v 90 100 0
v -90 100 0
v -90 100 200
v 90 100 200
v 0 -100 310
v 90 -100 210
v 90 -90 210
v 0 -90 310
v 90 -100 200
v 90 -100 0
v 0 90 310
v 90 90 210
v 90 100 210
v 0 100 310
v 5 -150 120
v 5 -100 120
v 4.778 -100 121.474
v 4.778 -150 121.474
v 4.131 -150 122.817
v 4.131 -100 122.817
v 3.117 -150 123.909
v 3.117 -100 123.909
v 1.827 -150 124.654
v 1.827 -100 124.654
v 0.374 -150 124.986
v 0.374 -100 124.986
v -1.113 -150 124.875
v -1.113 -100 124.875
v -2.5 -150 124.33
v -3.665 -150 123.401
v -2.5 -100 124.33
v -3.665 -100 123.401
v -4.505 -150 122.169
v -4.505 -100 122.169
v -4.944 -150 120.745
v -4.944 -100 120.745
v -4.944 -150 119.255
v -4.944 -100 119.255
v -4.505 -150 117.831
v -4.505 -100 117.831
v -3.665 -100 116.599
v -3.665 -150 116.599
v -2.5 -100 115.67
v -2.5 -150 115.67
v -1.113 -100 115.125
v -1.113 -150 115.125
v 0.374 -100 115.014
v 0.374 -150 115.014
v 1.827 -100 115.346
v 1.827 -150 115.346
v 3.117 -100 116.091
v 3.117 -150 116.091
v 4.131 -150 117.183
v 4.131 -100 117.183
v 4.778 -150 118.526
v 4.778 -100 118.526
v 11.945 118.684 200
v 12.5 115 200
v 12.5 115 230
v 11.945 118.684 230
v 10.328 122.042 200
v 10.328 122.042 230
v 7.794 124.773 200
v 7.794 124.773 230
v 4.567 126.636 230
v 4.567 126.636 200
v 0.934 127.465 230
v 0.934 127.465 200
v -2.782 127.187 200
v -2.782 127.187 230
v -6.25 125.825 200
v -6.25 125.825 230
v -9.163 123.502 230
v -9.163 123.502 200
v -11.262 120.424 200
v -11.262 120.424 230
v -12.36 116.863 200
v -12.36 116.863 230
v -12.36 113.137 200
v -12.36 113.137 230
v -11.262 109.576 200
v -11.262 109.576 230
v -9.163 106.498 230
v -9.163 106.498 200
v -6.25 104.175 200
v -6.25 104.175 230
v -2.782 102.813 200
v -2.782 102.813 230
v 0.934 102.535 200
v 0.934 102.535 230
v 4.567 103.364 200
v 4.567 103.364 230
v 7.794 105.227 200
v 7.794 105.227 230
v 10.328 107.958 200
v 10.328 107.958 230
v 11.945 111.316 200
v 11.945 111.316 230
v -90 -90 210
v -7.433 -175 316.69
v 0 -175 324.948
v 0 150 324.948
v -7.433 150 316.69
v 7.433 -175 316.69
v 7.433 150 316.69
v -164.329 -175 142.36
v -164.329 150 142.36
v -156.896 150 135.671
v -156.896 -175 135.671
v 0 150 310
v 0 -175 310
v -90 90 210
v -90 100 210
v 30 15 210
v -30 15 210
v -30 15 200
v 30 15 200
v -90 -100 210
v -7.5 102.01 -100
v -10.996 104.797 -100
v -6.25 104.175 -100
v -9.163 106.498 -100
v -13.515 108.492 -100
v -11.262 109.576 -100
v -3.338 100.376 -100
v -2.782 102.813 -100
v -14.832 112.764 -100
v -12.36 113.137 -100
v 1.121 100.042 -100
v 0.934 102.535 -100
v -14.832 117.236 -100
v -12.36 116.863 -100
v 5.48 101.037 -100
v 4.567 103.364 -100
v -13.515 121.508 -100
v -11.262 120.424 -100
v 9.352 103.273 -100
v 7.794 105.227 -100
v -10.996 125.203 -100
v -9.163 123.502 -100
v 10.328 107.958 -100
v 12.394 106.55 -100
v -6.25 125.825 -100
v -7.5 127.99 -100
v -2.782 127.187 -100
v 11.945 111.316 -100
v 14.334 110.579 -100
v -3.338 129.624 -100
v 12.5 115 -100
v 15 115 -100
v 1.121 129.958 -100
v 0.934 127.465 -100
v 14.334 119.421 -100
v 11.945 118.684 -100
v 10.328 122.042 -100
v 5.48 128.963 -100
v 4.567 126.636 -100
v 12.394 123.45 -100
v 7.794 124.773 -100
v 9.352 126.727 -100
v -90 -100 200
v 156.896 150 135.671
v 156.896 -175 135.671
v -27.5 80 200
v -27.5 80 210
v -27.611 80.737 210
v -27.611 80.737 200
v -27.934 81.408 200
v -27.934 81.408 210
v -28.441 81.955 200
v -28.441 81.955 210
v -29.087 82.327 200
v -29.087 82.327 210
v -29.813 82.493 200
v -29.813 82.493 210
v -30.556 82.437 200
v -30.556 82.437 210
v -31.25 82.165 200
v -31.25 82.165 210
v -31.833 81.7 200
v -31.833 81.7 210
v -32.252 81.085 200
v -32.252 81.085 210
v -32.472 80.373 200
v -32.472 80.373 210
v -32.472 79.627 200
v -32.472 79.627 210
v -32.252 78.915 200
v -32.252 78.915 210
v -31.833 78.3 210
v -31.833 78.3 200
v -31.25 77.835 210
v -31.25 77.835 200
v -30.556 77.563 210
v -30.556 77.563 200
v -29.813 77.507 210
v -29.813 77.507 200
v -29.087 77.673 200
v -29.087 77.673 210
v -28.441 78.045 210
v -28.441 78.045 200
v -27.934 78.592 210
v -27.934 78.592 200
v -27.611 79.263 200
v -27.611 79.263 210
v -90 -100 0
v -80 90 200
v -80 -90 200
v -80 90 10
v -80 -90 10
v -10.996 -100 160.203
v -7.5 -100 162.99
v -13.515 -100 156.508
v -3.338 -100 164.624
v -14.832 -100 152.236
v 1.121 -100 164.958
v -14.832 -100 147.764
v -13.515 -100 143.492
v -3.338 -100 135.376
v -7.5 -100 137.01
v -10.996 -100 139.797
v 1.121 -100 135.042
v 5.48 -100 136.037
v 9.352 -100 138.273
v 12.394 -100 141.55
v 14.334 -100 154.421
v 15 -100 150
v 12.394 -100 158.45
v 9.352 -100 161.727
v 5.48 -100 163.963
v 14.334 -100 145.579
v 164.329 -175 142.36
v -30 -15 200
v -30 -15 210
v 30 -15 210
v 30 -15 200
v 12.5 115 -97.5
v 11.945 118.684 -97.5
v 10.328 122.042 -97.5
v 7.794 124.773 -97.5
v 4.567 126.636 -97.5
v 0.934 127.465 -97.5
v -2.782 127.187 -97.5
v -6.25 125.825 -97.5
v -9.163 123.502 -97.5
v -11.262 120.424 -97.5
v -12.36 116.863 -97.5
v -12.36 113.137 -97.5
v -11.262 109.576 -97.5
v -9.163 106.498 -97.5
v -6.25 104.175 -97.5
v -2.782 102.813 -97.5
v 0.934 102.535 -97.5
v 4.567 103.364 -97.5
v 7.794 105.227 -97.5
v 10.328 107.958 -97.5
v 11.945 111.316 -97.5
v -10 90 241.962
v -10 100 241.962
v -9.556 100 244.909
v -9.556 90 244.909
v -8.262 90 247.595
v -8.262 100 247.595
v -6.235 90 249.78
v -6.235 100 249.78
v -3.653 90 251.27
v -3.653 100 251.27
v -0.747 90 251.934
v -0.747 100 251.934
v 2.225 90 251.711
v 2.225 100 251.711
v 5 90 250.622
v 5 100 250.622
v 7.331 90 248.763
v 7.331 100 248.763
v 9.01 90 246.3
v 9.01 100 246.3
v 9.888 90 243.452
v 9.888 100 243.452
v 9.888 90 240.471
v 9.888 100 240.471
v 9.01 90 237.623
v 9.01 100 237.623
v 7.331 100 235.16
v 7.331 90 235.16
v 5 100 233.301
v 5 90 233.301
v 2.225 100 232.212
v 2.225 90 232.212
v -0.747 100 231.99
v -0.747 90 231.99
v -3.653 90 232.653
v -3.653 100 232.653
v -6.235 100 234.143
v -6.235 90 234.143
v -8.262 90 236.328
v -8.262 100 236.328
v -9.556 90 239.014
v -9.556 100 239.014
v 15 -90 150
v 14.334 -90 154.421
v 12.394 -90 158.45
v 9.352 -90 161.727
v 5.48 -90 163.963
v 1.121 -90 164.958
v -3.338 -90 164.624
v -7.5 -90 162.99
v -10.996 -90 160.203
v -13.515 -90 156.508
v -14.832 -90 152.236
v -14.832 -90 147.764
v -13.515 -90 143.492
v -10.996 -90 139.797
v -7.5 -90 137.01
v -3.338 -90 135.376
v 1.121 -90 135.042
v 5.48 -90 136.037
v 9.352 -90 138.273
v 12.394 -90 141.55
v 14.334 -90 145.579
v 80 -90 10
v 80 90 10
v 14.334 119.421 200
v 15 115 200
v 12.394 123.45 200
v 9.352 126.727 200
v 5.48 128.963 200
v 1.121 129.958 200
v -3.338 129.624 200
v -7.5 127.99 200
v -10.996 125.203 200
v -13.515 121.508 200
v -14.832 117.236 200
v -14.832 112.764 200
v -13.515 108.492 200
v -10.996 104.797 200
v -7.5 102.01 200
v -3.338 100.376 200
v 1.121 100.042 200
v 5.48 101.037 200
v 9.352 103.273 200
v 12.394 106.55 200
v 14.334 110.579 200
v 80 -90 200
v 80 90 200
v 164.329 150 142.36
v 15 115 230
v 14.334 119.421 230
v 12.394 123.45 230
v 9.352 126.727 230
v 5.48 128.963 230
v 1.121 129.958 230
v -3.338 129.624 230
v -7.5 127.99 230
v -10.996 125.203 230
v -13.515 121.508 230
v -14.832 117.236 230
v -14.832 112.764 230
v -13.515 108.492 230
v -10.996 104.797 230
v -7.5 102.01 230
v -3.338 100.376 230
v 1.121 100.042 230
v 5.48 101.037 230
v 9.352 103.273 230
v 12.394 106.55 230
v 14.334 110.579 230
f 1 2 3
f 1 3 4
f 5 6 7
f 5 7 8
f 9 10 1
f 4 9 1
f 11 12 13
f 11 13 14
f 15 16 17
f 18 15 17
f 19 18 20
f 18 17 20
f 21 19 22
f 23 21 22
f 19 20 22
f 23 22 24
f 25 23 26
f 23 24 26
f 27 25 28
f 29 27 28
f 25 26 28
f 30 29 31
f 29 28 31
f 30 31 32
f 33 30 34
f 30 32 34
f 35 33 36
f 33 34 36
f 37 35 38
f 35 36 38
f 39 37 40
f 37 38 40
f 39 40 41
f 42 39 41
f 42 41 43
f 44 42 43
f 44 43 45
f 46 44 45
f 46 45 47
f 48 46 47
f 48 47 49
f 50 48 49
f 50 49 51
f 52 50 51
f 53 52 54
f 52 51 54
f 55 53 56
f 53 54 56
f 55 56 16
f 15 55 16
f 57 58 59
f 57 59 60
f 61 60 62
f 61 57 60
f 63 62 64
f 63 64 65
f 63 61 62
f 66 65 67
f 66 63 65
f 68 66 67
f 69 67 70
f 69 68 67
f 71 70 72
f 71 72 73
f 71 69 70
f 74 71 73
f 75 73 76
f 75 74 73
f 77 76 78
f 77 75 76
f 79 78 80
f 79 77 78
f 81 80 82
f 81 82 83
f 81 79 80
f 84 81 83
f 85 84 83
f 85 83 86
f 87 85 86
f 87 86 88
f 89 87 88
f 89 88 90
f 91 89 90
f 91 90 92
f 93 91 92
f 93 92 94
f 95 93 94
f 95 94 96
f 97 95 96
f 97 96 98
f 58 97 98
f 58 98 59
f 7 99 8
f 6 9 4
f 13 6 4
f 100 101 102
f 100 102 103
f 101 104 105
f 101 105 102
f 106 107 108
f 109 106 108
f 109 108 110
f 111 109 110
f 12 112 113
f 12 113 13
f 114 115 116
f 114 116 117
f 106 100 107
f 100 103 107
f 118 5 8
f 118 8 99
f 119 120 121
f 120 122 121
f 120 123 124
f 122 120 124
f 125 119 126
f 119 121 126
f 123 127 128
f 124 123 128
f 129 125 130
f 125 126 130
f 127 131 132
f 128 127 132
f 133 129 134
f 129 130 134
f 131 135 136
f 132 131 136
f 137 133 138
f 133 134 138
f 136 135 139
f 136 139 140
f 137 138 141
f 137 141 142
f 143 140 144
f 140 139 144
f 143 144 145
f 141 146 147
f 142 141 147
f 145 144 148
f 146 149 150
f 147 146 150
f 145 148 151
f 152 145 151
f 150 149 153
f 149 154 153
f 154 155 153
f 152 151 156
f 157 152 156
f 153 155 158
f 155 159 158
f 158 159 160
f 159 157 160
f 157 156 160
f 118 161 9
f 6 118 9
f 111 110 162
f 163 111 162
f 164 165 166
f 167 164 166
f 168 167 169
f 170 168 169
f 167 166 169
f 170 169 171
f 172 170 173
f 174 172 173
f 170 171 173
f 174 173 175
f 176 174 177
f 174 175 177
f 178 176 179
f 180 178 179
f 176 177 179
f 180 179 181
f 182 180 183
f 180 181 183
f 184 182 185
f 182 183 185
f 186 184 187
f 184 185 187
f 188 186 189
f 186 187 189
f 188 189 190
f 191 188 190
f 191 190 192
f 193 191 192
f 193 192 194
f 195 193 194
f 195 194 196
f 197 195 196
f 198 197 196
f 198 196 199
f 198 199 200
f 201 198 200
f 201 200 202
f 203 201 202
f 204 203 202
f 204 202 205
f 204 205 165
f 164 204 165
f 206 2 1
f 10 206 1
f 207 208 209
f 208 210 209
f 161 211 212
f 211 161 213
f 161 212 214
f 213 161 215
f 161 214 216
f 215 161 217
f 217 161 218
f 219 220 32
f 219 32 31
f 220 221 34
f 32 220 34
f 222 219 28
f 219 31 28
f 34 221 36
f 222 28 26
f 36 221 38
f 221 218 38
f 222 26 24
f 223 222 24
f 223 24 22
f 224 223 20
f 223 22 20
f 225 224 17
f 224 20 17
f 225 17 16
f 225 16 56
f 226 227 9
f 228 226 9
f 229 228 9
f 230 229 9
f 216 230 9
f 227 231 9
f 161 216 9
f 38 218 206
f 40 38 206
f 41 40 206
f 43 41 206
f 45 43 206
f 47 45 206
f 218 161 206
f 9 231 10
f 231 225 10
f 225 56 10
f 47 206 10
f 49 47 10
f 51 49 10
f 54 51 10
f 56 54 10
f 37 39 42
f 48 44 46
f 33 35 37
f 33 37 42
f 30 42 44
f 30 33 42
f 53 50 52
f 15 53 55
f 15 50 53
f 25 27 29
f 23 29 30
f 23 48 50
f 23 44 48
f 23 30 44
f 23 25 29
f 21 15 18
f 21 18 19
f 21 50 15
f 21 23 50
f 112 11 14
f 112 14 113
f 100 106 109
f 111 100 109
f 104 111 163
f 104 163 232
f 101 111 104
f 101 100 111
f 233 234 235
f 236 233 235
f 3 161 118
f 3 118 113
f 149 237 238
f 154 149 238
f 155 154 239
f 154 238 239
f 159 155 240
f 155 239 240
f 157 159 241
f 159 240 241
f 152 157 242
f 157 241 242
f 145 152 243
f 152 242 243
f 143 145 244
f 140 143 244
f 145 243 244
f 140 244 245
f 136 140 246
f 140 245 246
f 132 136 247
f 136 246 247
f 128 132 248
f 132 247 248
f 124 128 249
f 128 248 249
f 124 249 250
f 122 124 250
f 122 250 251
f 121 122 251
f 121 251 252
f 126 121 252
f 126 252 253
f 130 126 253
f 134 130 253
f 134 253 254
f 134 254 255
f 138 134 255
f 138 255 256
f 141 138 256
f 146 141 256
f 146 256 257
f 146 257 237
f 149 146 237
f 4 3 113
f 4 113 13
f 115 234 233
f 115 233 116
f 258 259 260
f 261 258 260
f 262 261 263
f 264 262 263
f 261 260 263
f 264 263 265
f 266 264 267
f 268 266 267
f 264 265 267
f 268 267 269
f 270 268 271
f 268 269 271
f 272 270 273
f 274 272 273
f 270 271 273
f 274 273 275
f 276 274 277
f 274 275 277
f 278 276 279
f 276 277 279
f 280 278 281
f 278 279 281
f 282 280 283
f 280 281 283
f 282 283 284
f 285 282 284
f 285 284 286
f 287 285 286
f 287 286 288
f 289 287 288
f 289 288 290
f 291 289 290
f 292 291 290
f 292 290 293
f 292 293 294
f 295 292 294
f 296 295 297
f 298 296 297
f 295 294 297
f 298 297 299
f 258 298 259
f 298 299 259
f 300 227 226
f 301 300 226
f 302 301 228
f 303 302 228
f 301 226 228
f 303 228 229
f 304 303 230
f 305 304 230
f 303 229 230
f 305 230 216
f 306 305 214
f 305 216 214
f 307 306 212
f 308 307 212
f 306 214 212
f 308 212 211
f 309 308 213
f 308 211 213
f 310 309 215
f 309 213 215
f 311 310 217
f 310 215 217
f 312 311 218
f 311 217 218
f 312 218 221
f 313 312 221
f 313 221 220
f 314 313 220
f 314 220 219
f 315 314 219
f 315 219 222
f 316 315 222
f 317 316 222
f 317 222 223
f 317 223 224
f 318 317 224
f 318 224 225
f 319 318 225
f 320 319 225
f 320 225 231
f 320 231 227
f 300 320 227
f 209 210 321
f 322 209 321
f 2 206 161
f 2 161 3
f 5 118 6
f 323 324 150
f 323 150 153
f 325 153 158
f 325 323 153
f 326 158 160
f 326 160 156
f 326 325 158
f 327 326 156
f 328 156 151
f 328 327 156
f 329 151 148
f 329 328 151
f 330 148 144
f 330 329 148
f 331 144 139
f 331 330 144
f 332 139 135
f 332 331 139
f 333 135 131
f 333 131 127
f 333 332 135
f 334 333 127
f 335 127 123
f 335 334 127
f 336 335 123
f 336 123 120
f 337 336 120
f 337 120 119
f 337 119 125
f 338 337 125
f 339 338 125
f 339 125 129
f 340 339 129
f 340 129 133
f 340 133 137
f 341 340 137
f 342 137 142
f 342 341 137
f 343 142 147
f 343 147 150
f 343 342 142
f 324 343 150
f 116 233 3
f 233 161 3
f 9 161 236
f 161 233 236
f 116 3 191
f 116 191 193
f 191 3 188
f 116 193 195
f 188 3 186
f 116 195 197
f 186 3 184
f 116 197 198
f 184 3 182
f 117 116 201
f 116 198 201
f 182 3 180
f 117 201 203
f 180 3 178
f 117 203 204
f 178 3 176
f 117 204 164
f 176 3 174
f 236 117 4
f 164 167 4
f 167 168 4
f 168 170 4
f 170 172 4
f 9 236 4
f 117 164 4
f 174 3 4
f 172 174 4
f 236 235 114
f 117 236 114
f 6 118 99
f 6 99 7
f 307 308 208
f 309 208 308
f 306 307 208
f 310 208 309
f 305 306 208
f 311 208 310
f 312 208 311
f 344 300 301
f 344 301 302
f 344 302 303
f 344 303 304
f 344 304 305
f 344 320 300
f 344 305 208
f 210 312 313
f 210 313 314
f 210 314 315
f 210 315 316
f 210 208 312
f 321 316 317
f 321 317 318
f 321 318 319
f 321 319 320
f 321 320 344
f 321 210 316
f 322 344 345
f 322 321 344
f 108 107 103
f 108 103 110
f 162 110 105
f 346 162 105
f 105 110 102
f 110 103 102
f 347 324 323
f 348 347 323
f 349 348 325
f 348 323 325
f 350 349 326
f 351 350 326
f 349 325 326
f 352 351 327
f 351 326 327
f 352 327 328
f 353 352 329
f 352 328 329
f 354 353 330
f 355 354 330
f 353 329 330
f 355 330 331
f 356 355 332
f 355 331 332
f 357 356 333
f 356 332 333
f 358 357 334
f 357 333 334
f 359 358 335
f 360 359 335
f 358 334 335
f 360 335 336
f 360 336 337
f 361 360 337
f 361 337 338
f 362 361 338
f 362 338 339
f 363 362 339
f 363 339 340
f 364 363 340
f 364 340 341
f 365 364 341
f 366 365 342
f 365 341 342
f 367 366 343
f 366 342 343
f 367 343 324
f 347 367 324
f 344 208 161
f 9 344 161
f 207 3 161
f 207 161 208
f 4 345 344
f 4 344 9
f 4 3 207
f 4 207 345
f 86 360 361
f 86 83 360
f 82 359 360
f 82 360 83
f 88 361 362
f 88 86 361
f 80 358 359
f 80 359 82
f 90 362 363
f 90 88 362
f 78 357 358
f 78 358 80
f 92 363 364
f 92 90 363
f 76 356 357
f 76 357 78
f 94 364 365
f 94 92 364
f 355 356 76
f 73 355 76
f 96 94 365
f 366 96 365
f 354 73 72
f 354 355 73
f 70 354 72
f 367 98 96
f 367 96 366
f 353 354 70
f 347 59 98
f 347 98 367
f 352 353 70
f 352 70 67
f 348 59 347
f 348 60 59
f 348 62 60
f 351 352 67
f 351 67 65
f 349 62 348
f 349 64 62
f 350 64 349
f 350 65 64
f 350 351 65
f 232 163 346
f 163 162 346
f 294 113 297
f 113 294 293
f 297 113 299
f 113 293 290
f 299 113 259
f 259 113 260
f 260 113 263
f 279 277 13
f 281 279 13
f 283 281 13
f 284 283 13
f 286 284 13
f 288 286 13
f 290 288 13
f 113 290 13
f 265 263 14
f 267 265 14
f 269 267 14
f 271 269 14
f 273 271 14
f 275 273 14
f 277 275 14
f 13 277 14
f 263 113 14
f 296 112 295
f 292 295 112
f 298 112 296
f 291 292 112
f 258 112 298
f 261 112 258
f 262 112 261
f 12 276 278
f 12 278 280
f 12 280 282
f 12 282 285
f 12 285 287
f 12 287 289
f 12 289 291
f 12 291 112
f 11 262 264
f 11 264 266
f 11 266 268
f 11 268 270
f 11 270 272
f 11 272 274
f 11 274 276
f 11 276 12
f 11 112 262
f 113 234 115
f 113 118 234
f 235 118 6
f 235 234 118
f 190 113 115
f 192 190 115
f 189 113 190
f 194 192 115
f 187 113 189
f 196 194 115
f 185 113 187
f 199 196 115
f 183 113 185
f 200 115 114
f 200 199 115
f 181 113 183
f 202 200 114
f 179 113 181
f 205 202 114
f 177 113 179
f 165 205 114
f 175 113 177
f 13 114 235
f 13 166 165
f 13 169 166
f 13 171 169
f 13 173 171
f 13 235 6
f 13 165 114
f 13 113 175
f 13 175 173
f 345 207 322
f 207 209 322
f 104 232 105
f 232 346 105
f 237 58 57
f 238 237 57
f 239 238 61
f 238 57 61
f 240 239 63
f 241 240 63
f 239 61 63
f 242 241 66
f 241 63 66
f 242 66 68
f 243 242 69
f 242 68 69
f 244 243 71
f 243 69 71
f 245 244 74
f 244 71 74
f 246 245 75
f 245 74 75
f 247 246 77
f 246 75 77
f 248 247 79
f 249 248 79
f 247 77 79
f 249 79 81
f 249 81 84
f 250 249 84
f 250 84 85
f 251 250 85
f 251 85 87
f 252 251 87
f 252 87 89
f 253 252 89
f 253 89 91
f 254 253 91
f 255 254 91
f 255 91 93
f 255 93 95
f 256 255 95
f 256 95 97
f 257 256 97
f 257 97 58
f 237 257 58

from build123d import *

# Parameters (mm, degrees)
F0_W           = 180
F0_H           = 200
F1_DEPTH       = 200
F2_T           = -10
F3_R           = 15
F4_DEPTH       = 25
F3_R_2         = 5
F5_DEPTH       = 50
F7_DEPTH       = 300
F7_DEPTH_BACK  = 30
F8_W           = 180
F8_H           = 200
F8_W_2         = 160
F8_H_2         = 180
F9_DEPTH       = 10
F11_DEPTH      = 250
F11_DEPTH_BACK = 75
F12_DEPTH      = 10
F13_START      = -190
F13_DEPTH      = 10
F14_R          = 10
F15_DEPTH      = 10
F16_W          = 60
F16_H          = 30
F16_R          = 2.5
F17_DEPTH      = 25
F18_T          = -2.5
F19_DEPTH      = 25


with BuildPart() as f1:
    # F0 (on Top) → F1 (new body)
    with BuildSketch(Plane.XY):
        Rectangle(F0_W, F0_H)
    extrude(amount=F1_DEPTH)

    # F2
    f2_openings = [f1.faces().sort_by_distance(p)[0] for p in [
        (0, 0, 200),
    ]]
    offset(amount=F2_T, openings=f2_openings)

    # F3 (on face) → F4 (cut)
    with BuildSketch(Plane.XZ.offset(100)):
        with Locations((0, 150)):
            Circle(F3_R)
    extrude(amount=-F4_DEPTH, mode=Mode.SUBTRACT)

    # F3 (on face) → F5 (join)
    with BuildSketch(Plane.XZ.offset(100)):
        with Locations((0, 120)):
            Circle(F3_R_2)
    extrude(amount=F5_DEPTH)


with BuildPart() as f7:
    # F6 (on face) → F7 (new body, two sides)
    with BuildSketch(Plane.XY.offset(200)) as f7_sk:
        with BuildLine():
            ThreePointArc((7.38e-08, 100), (10.6066017439, 104.3933983083), (15, 115))
            ThreePointArc((15, 115), (-10.6066017439, 125.6066016917), (7.38e-08, 100))
        make_face()
    extrude(amount=-F7_DEPTH)
    extrude(f7_sk.sketch, amount=F7_DEPTH_BACK)

    # F18
    f18_openings = [f7.faces().sort_by_distance(p)[0] for p in [
        (0, 115, 230),
    ]]
    offset(amount=F18_T, openings=f18_openings)

    # F19 (cut): a face of the model
    f19_faces = [f7.faces().sort_by_distance(p)[0] for p in [
        (0, 115, -97.5),
    ]]
    extrude(f19_faces, amount=-F19_DEPTH, mode=Mode.SUBTRACT)


with BuildPart() as f9:
    # F8 (on face) → F9 (new body)
    with BuildSketch(Plane.XY.offset(200)):
        Rectangle(F8_W, F8_H)
        Rectangle(F8_W_2, F8_H_2, mode=Mode.SUBTRACT)
        Rectangle(F8_W_2, F8_H_2)
    extrude(amount=F9_DEPTH)

    # F16 (on face) → F17 (cut)
    with BuildSketch(Plane.XY.offset(210)):
        Rectangle(F16_W, F16_H)
        with Locations((-30, 80)):
            Circle(F16_R)
    extrude(amount=-F17_DEPTH, mode=Mode.SUBTRACT)


with BuildPart() as f11:
    # F10 (on face) → F11 (new body, two sides)
    with BuildSketch(Plane.XZ.offset(100)) as f11_sk:
        Polygon((-90, 210), (0, 310), (90, 210), (156.8964731622, 135.6705853753), (164.3294146247, 142.3602326915), (97.4329414625, 216.6896473162), (7.4329414625, 316.6896473162), (0, 324.9484711634), (-7.4329414625, 316.6896473162), (-97.4329414625, 216.6896473162), (-164.3294146247, 142.3602326915), (-156.8964731622, 135.6705853753), align=None)
    extrude(amount=-F11_DEPTH)
    extrude(f11_sk.sketch, amount=F11_DEPTH_BACK)


with BuildPart() as f12:
    # F10 (on face) → F12 (new body)
    with BuildSketch(Plane.XZ.offset(100)):
        Polygon((90, 210), (0, 310), (-90, 210), align=None)
    extrude(amount=-F12_DEPTH)


with BuildPart() as f13:
    # F10 (on face) → F13 (new body)
    with BuildSketch(Plane.XZ.offset(100).offset(F13_START)):
        Polygon((90, 210), (0, 310), (-90, 210), align=None)
    extrude(amount=-F13_DEPTH)

    # F14 (on face) → F15 (cut)
    with BuildSketch(Plane(origin=(0, 100, 0), x_dir=(-1, 0, 0), z_dir=(0, 1, 0))):
        with Locations((0, 241.9616430998)):
            Circle(F14_R)
    extrude(amount=-F15_DEPTH, mode=Mode.SUBTRACT)


solid = Compound([f1.part, f7.part, f9.part, f11.part, f12.part, f13.part])
